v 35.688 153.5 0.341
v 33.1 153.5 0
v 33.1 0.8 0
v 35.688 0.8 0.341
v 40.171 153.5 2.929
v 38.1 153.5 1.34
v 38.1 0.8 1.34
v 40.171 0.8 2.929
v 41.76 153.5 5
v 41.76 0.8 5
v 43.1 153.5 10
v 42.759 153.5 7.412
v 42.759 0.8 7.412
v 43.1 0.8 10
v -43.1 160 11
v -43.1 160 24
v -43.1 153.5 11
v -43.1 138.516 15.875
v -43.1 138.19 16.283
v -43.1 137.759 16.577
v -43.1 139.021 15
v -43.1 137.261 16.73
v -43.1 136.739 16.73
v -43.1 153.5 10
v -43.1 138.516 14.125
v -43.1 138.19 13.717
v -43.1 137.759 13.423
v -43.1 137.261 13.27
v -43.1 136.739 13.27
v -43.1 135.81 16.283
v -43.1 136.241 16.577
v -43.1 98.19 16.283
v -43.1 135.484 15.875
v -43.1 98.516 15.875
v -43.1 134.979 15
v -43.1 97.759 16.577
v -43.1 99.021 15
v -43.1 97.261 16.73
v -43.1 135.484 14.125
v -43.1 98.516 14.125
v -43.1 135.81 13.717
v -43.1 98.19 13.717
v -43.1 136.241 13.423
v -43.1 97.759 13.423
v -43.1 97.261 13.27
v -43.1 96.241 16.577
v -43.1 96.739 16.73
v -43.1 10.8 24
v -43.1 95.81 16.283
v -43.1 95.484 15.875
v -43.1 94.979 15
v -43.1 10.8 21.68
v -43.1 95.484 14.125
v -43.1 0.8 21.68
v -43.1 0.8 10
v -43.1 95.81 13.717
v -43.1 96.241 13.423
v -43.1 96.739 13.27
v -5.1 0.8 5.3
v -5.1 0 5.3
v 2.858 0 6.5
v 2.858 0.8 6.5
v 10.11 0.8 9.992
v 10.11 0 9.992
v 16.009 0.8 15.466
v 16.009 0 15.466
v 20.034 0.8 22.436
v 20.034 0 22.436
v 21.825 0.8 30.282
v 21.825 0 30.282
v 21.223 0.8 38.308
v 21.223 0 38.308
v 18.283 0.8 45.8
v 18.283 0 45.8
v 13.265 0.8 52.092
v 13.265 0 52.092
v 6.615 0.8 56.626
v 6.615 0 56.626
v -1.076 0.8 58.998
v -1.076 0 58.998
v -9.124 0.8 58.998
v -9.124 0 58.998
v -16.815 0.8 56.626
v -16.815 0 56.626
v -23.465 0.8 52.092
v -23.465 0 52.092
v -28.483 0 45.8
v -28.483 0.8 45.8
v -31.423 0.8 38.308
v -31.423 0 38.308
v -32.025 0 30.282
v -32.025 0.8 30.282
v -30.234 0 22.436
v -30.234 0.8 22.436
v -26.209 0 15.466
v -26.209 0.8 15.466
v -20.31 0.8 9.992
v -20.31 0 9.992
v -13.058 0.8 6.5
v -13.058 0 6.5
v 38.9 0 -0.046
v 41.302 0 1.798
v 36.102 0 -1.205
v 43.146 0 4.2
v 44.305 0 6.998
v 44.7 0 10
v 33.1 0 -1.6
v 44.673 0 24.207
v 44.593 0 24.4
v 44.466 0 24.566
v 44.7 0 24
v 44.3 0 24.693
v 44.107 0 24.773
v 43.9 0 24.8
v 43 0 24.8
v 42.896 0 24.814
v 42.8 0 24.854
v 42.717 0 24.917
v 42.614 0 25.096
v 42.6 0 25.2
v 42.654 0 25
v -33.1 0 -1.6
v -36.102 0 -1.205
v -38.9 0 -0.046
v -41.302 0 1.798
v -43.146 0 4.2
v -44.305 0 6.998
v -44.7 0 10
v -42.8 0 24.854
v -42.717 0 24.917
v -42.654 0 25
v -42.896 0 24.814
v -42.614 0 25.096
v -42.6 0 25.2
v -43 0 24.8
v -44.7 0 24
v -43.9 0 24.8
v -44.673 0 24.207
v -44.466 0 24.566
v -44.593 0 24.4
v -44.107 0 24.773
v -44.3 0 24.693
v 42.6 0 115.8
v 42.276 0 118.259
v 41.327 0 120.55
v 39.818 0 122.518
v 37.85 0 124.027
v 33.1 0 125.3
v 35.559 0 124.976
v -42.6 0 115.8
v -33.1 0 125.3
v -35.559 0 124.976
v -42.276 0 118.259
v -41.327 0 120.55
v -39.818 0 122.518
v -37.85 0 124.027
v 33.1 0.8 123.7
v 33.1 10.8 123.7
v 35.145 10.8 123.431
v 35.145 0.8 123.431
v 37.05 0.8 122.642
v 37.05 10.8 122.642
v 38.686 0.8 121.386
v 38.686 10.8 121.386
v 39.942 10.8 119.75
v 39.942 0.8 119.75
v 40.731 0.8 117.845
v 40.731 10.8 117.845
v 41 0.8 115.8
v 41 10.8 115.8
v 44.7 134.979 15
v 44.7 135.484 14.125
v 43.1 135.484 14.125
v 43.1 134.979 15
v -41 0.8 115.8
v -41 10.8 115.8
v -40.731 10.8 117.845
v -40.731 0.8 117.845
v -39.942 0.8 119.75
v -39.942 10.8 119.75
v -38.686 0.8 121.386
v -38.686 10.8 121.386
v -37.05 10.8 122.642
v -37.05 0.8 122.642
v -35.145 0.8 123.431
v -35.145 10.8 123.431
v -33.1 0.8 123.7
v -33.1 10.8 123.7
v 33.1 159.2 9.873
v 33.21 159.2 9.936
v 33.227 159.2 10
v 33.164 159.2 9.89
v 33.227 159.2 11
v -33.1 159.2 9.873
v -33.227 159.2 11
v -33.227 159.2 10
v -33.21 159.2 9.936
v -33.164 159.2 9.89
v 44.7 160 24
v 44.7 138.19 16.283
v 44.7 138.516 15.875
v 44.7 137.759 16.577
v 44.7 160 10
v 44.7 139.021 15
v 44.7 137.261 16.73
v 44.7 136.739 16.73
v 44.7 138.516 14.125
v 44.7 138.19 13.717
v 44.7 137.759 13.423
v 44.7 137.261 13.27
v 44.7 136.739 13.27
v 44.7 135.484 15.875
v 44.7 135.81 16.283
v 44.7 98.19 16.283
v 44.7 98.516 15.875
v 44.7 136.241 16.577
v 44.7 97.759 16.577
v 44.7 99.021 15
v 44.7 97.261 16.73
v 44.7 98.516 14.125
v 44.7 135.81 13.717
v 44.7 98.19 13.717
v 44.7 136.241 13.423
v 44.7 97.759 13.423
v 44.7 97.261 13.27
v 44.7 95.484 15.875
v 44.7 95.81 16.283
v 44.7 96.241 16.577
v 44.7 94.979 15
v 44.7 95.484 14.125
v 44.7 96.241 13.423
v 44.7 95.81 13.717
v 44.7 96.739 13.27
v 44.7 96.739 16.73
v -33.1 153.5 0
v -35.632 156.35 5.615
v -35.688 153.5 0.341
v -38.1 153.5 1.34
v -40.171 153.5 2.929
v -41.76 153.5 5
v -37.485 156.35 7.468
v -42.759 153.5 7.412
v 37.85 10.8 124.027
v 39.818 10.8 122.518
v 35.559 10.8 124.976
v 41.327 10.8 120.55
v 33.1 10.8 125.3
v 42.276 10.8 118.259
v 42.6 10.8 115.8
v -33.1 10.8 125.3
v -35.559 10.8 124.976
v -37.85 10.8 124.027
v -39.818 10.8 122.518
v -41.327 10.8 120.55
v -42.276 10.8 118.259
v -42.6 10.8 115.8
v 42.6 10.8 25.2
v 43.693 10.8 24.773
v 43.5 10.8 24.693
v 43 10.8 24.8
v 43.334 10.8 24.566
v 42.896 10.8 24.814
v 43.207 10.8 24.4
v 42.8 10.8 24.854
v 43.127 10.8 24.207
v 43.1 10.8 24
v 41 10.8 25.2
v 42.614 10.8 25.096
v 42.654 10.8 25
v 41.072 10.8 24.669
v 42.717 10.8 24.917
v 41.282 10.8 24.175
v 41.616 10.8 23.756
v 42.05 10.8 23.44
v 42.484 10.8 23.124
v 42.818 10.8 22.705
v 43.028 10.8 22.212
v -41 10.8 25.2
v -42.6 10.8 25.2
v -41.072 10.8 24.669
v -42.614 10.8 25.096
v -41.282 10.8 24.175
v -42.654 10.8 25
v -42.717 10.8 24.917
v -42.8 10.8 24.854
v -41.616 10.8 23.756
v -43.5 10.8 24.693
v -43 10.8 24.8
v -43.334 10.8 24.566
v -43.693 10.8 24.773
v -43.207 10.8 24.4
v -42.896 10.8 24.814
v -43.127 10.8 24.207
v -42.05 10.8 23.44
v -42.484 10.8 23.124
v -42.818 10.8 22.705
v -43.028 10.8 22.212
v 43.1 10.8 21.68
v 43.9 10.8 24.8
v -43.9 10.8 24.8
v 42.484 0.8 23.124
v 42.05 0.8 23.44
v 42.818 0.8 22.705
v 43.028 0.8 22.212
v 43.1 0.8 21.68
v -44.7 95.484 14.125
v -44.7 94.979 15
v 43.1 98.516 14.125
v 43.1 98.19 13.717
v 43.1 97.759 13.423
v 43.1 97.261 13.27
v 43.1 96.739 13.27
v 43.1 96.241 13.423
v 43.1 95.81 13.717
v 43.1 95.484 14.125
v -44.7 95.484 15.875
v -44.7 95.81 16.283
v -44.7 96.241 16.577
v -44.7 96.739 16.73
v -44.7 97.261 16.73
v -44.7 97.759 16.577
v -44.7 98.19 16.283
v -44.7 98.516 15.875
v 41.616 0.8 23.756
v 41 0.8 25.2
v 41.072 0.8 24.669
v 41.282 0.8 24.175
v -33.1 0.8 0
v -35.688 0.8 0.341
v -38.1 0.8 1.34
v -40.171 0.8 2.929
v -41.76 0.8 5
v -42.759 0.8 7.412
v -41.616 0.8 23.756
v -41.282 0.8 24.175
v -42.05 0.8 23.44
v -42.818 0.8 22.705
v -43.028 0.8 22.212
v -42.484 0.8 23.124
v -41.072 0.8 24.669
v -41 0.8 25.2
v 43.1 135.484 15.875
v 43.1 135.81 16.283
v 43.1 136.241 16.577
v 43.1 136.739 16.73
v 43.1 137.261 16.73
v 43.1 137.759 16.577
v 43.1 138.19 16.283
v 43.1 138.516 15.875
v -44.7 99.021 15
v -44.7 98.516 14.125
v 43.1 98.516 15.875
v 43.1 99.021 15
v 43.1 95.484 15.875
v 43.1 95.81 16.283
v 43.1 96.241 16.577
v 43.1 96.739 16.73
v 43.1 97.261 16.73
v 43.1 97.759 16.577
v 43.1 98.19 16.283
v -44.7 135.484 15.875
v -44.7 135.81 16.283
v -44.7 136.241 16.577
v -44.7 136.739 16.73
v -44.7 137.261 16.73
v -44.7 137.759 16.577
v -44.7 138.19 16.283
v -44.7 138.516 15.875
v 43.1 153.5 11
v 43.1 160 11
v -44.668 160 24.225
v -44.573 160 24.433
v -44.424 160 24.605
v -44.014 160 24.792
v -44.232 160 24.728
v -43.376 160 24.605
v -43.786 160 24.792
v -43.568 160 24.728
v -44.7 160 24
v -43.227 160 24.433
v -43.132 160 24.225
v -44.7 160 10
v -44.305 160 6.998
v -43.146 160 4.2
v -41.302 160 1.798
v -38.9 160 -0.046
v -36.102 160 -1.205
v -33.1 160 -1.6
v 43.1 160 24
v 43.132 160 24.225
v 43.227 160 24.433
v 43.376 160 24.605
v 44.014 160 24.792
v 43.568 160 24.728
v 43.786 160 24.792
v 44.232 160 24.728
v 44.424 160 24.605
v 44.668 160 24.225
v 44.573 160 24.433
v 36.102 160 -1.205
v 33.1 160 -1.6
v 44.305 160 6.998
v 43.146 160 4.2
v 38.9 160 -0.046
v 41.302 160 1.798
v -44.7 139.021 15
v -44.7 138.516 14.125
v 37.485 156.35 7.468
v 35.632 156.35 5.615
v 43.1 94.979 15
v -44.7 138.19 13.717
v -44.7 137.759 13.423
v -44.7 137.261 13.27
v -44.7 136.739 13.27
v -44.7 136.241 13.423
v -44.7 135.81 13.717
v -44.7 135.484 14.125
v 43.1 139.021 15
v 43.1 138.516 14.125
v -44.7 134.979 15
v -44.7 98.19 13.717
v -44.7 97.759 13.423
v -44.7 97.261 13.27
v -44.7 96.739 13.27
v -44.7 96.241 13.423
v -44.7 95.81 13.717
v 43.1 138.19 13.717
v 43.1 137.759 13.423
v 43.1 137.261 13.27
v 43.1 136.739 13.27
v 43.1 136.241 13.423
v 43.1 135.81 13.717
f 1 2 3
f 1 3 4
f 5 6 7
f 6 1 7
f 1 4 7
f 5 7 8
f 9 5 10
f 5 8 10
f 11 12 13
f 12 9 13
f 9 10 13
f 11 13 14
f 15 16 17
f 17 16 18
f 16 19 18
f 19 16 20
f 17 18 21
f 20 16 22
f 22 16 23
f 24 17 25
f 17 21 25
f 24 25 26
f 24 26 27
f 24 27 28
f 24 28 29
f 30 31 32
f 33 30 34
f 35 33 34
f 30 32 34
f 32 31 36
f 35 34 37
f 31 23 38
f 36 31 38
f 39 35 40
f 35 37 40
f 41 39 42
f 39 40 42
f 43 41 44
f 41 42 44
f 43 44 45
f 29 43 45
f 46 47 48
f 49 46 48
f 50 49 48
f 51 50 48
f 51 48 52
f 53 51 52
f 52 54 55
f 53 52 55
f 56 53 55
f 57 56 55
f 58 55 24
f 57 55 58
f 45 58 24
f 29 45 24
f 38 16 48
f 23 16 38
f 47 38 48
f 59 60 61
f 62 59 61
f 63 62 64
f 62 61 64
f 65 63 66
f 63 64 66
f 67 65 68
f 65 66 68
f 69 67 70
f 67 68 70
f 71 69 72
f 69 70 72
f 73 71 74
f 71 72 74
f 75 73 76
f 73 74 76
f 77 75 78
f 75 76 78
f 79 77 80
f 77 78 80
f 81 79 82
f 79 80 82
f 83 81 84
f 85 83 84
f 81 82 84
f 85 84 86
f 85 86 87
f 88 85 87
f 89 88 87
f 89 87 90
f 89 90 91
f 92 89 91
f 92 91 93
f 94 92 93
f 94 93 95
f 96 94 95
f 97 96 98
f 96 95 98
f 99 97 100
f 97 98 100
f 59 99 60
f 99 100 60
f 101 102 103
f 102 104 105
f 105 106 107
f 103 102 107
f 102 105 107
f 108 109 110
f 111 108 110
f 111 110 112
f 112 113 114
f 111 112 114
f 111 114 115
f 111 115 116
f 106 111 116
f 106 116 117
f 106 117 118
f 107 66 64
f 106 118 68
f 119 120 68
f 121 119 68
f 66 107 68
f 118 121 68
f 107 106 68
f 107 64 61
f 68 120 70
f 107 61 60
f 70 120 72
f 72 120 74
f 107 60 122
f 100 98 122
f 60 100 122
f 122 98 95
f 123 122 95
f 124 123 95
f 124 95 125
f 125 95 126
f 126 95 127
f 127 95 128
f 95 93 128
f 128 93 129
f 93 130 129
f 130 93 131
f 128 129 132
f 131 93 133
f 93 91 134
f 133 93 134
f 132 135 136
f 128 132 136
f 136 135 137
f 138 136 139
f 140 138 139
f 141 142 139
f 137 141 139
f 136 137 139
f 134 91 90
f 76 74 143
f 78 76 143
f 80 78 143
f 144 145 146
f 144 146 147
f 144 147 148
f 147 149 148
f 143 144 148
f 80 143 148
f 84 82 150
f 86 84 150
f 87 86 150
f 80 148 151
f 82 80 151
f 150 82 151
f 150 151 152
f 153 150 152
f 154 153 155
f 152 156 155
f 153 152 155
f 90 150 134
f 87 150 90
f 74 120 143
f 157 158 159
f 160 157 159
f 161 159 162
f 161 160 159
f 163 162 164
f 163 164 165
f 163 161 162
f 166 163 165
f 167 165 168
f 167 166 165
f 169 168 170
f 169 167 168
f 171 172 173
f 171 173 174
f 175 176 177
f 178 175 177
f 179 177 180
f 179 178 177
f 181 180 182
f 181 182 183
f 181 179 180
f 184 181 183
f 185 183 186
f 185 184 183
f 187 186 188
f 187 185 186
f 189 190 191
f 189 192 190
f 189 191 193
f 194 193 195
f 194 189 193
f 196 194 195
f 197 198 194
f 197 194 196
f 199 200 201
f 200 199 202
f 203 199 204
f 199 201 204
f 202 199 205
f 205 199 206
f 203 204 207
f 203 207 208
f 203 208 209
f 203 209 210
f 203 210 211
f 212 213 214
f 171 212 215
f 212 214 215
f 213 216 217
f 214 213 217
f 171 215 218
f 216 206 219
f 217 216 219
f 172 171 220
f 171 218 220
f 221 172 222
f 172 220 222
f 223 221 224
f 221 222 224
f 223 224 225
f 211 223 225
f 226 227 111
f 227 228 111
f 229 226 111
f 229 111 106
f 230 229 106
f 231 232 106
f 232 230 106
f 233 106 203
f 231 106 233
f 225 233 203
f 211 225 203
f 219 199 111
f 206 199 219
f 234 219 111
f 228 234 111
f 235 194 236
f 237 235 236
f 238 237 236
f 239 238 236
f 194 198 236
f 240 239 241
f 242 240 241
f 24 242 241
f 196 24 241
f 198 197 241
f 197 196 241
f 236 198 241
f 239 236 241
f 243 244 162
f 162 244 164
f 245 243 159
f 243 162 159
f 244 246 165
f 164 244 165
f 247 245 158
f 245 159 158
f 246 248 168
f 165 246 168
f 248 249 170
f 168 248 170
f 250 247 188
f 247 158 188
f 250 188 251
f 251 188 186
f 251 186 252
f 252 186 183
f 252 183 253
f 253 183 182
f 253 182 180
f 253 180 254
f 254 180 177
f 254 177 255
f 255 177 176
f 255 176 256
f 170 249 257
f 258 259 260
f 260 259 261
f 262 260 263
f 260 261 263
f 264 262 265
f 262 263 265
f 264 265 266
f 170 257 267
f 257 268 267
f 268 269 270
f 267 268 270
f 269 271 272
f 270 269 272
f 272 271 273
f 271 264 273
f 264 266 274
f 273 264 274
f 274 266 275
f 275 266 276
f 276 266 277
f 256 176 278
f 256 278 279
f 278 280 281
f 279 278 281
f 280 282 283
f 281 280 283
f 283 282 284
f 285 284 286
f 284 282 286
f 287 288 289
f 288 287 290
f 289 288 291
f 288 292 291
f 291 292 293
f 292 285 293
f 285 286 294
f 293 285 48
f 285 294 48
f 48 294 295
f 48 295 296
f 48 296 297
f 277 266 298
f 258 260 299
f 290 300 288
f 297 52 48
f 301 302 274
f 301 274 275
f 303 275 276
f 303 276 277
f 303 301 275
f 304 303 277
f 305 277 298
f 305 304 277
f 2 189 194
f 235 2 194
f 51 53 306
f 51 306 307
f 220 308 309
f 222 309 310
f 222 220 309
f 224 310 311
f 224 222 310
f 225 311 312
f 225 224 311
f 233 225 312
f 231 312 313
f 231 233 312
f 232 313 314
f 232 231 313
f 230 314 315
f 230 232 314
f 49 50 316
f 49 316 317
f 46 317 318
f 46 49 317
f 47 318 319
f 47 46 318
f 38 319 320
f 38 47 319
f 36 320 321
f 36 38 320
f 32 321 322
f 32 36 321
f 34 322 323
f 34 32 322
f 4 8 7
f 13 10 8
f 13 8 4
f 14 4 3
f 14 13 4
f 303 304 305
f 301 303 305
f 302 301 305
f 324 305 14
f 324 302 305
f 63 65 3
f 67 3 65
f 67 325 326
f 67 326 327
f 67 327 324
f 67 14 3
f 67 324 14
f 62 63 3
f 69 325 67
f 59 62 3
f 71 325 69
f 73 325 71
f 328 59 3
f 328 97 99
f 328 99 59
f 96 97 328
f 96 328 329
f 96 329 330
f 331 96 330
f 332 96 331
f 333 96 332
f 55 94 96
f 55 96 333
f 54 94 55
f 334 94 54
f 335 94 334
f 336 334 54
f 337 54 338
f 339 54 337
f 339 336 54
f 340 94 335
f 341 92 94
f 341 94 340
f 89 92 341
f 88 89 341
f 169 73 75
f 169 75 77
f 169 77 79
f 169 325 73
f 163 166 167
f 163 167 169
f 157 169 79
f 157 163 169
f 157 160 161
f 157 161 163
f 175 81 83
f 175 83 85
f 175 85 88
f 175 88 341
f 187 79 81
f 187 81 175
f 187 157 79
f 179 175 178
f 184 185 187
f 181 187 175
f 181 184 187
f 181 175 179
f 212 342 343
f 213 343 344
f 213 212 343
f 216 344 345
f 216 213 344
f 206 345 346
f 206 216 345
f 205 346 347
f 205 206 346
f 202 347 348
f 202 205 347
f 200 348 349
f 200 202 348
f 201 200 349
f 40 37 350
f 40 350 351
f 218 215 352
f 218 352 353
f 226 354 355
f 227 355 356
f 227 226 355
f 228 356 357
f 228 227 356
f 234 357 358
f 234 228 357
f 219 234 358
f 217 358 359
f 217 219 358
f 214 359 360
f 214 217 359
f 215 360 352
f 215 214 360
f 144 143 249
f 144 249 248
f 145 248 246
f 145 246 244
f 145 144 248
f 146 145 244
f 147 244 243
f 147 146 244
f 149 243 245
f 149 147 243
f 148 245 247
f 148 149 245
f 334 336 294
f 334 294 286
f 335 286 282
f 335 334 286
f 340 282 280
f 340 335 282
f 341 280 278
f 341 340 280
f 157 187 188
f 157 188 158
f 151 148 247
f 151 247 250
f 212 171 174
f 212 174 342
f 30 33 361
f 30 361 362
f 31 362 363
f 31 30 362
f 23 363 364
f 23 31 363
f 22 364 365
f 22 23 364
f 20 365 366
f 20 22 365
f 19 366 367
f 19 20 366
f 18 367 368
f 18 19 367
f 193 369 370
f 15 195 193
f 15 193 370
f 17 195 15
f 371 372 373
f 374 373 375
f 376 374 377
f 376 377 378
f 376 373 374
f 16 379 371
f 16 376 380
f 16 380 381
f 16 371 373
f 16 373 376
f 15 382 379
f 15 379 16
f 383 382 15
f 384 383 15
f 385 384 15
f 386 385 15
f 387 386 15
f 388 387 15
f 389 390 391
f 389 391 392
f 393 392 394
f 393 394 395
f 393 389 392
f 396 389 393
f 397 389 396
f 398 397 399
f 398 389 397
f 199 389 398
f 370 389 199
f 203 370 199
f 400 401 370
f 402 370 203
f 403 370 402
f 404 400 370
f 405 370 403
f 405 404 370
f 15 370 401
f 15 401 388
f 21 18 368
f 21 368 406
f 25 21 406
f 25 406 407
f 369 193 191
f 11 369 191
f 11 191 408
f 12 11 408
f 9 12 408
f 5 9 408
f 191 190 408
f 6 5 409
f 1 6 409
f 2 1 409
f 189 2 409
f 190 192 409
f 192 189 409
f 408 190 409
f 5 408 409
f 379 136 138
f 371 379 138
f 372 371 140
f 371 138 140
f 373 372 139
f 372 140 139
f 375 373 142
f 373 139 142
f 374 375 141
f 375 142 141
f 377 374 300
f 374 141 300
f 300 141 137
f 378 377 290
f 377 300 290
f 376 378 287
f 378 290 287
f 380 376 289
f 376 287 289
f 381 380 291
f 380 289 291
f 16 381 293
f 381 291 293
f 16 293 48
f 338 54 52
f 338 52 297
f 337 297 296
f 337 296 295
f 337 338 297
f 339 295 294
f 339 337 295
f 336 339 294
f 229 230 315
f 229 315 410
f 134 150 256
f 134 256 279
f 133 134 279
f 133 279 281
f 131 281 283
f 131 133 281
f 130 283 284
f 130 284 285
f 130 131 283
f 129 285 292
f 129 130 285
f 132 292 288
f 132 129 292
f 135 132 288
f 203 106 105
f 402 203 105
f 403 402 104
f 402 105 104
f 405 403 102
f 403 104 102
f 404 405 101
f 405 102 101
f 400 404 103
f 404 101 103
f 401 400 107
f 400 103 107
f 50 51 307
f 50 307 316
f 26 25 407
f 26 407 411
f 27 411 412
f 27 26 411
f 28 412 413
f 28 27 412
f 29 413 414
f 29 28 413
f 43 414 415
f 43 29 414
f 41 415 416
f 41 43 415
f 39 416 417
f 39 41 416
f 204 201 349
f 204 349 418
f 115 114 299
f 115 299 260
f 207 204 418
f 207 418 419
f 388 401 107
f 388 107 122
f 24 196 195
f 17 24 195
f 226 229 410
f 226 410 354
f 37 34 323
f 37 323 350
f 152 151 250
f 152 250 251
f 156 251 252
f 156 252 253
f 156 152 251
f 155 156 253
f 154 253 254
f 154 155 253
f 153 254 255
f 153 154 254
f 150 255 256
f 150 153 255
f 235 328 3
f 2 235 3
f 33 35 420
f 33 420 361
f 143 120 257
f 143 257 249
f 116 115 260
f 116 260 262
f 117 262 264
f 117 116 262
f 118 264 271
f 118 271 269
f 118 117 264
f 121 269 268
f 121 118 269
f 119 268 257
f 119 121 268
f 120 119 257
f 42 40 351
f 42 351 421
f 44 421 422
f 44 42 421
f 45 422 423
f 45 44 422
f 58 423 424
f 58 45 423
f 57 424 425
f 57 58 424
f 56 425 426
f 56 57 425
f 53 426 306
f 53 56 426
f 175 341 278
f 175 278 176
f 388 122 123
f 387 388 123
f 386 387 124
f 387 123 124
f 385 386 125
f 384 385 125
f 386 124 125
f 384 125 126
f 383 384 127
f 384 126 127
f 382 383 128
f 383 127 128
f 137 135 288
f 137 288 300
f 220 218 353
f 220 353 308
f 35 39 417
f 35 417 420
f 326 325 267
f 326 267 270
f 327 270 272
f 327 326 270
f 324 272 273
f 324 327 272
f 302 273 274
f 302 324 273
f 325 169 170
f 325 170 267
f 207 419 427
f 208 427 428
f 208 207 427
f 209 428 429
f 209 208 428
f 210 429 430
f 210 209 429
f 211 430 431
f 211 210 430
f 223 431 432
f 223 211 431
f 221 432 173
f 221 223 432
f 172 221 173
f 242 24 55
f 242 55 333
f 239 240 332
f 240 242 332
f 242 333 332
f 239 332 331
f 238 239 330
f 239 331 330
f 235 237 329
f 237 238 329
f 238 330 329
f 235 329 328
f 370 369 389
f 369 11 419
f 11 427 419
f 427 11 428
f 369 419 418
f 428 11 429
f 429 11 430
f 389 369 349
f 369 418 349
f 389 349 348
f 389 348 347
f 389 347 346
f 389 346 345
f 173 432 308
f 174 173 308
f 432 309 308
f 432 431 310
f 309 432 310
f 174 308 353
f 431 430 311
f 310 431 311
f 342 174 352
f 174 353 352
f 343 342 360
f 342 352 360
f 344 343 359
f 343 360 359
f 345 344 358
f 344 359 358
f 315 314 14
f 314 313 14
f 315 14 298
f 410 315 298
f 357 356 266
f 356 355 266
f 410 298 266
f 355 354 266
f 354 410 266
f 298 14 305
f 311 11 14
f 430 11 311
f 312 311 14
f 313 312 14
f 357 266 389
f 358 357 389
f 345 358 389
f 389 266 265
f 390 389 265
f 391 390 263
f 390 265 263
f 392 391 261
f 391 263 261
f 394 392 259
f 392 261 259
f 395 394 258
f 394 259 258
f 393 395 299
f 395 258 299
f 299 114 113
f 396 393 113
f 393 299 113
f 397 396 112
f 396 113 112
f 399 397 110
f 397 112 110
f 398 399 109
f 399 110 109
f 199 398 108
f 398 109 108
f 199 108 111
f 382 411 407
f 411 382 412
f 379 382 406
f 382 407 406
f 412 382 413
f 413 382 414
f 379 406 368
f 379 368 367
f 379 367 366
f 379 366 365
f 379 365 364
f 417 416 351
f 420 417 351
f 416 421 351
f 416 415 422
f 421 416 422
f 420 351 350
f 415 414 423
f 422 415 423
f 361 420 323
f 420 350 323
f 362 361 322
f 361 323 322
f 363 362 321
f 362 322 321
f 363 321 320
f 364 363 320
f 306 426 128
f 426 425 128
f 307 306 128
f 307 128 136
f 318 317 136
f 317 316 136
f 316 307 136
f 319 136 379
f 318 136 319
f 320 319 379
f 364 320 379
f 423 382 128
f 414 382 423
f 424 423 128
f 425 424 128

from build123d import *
from OCP.BRepFilletAPI import BRepFilletAPI_MakeChamfer

# Parameters (mm, degrees)
BOSS_EXTRUDE1_DEPTH = 160
BOSS_EXTRUDE2_START = -0.8
BOSS_EXTRUDE2_DEPTH = 0.8
CUT_EXTRUDE1_DEPTH  = 185.952426316
SKETCH4_R           = 27
BOSS_EXTRUDE3_DEPTH = 0.8
FILLET1_R           = 0.4
BOSS_EXTRUDE4_DEPTH = 10
FILLET2_R           = 2
CHAMFER1_SIZE       = 5.7
CHAMFER1_SIZE2      = 9.872689603


with BuildPart() as part:
    # Sketch1 → Boss-Extrude1 (new body)
    with BuildSketch(Plane(origin=(0, 0, 0), x_dir=(1, 0, 0), z_dir=(0, 1, 0))):
        with BuildLine():
            Line((-33.1, 0), (33.1, 0))
            ThreePointArc((33.1, 0), (40.171067812, -2.928932188), (43.1, -10))
            Line((43.1, -10), (43.1, -24))
            ThreePointArc((43.1, -24), (43.9, -24.8), (44.7, -24))
            Line((44.7, -24), (44.7, -10))
            ThreePointArc((44.7, -10), (41.302438662, -1.797561338), (33.1, 1.6))
            Line((33.1, 1.6), (-33.1, 1.6))
            ThreePointArc((-33.1, 1.6), (-41.302438662, -1.797561338), (-44.7, -10))
            Line((-44.7, -10), (-44.7, -24))
            ThreePointArc((-44.7, -24), (-43.9, -24.8), (-43.1, -24))
            Line((-43.1, -24), (-43.1, -10))
            ThreePointArc((-43.1, -10), (-40.171067812, -2.928932188), (-33.1, 0))
        make_face()
    extrude(amount=BOSS_EXTRUDE1_DEPTH)

    # Sketch2 → Boss-Extrude2 (add)
    with BuildSketch(Plane(origin=(0, 160, 0), x_dir=(1, 0, 0), z_dir=(0, 1, 0)).offset(BOSS_EXTRUDE2_START)):
        with BuildLine():
            Line((44.7, -10), (44.7, -11))
            Line((44.7, -11), (-44.7, -11))
            Line((-44.7, -11), (-44.7, -10))
            ThreePointArc((-44.7, -10), (-41.302438662, -1.797561338), (-33.1, 1.6))
            Line((-33.1, 1.6), (33.1, 1.6))
            ThreePointArc((33.1, 1.6), (41.302438662, -1.797561338), (44.7, -10))
        make_face()
    extrude(amount=BOSS_EXTRUDE2_DEPTH)

    # Sketch3 → Cut-Extrude1 (cut, through all)
    with BuildSketch(Plane(origin=(44.7, 0, 0), x_dir=(0, 0, -1), z_dir=(1, 0, 0))):
        with BuildLine():
            Line((-15.875, 138.515544457), (-15, 139.020725942))
            Line((-15, 139.020725942), (-14.125, 138.515544457))
            ThreePointArc((-14.125, 138.515544457), (-13.25, 137), (-14.125, 135.484455543))
            Line((-14.125, 135.484455543), (-15, 134.979274058))
            Line((-15, 134.979274058), (-15.875, 135.484455543))
            ThreePointArc((-15.875, 135.484455543), (-16.75, 137), (-15.875, 138.515544457))
        make_face()
        with BuildLine():
            Line((-15.875, 98.515544457), (-15, 99.020725942))
            Line((-15, 99.020725942), (-14.125, 98.515544457))
            ThreePointArc((-14.125, 98.515544457), (-13.25, 97), (-14.125, 95.484455543))
            Line((-14.125, 95.484455543), (-15, 94.979274058))
            Line((-15, 94.979274058), (-15.875, 95.484455543))
            ThreePointArc((-15.875, 95.484455543), (-16.75, 97), (-15.875, 98.515544457))
        make_face()
    extrude(amount=-CUT_EXTRUDE1_DEPTH, mode=Mode.SUBTRACT)

    # Sketch4 → Boss-Extrude3 (add)
    with BuildSketch(Plane.XZ):
        with BuildLine():
            Line((-43.9, 24.8), (-42.6, 24.8))
            Line((-42.6, 24.8), (-42.6, 115.8))
            ThreePointArc((-42.6, 115.8), (-39.817514421, 122.517514421), (-33.1, 125.3))
            Line((-33.1, 125.3), (33.1, 125.3))
            ThreePointArc((33.1, 125.3), (39.817514421, 122.517514421), (42.6, 115.8))
            Line((42.6, 115.8), (42.6, 24.8))
            Line((42.6, 24.8), (43.9, 24.8))
            ThreePointArc((43.9, 24.8), (43.334314575, 24.565685425), (43.1, 24))
            Line((43.1, 24), (43.1, 10))
            ThreePointArc((43.1, 10), (40.171067812, 2.928932188), (33.1, 0))
            Line((33.1, 0), (-33.1, 0))
            ThreePointArc((-33.1, 0), (-40.171067812, 2.928932188), (-43.1, 10))
            Line((-43.1, 10), (-43.1, 24))
            ThreePointArc((-43.1, 24), (-43.334314575, 24.565685425), (-43.9, 24.8))
        make_face()
        with Locations(Location((-5.1, 32.3, 0), (0, 0, 270))):
            Circle(SKETCH4_R, mode=Mode.SUBTRACT)
    extrude(amount=-BOSS_EXTRUDE3_DEPTH)

    # Fillet1
    fillet1_edges = [part.edges().sort_by_distance(p)[0] for p in [
        (-42.6, 0.4, 24.8),
        (42.6, 0.4, 24.8),
    ]]
    fillet(fillet1_edges, radius=FILLET1_R)

    # Sketch6 → Boss-Extrude4 (add)
    with BuildSketch(Plane(origin=(0, 0.8, 0), x_dir=(1, 0, 0), z_dir=(0, 1, 0))):
        with BuildLine():
            Line((-43.1, -23.2), (-43, -23.2))
            ThreePointArc((-43, -23.2), (-41.585786438, -23.785786438), (-41, -25.2))
            Line((-41, -25.2), (-41, -115.8))
            ThreePointArc((-41, -115.8), (-38.686143571, -121.386143571), (-33.1, -123.7))
            Line((-33.1, -123.7), (33.1, -123.7))
            ThreePointArc((33.1, -123.7), (38.686143571, -121.386143571), (41, -115.8))
            Line((41, -115.8), (41, -25.2))
            ThreePointArc((41, -25.2), (41.585786438, -23.785786438), (43, -23.2))
            Line((43, -23.2), (43.1, -23.2))
            Line((43.1, -23.2), (43.1, -24))
            ThreePointArc((43.1, -24), (43.334314575, -24.565685425), (43.9, -24.8))
            Line((43.9, -24.8), (43, -24.8))
            ThreePointArc((43, -24.8), (42.717157288, -24.917157288), (42.6, -25.2))
            Line((42.6, -25.2), (42.6, -115.8))
            ThreePointArc((42.6, -115.8), (39.817514421, -122.517514421), (33.1, -125.3))
            Line((33.1, -125.3), (-33.1, -125.3))
            ThreePointArc((-33.1, -125.3), (-39.817514421, -122.517514421), (-42.6, -115.8))
            Line((-42.6, -115.8), (-42.6, -25.2))
            ThreePointArc((-42.6, -25.2), (-42.717157288, -24.917157288), (-43, -24.8))
            Line((-43, -24.8), (-43.9, -24.8))
            ThreePointArc((-43.9, -24.8), (-43.334314575, -24.565685425), (-43.1, -24))
            Line((-43.1, -24), (-43.1, -23.2))
        make_face()
    extrude(amount=BOSS_EXTRUDE4_DEPTH)

    # Fillet2
    # the kernel refuses this fillet: 2 mm, written as the material it adds along each edge
    with BuildSketch(Plane(origin=(43.1, 0.8, 23.2), x_dir=(-0.9748527767632401, 0, 0.22284986793130537), z_dir=(0, 1, 0))) as fillet2_piece_1:
        with BuildLine():
            CenterArc((1.610986416, -1.927420567), FILLET2_R, 105.482875224, 61.640649972)
            Line((-0.338719137, -1.481720831), (-0.533689693, -1.437150857))
            Line((-0.533689693, -1.437150857), (-0.194970555, 0.044569974))
            Line((-0.194970555, 0.044569974), (0.044569974, 0.194970555))
            ThreePointArc((0.044569974, 0.194970555), (0.142055251, 0.172685569), (1.023695645, 0.192742057))
            Line((1.023695645, 0.192742057), (1.077085715, 0))
        make_face()
    extrude(amount=10)
    with BuildSketch(Plane(origin=(-43.1, 0.8, 23.2), x_dir=(0.9748527767632457, 0, 0.2228498679312814), z_dir=(0, 1, 0))) as fillet2_piece_2:
        with BuildLine():
            CenterArc((1.610986416, 1.927420567), FILLET2_R, 192.876474804, 61.640649972)
            Line((-0.338719137, 1.481720831), (-0.533689693, 1.437150857))
            Line((-0.533689693, 1.437150857), (-0.194970555, -0.044569974))
            Line((-0.194970555, -0.044569974), (0.044569974, -0.194970555))
            ThreePointArc((0.044569974, -0.194970555), (0.142055251, -0.172685569), (1.023695645, -0.192742057))
            Line((1.023695645, -0.192742057), (1.077085715, 0))
        make_face()
    extrude(amount=10)

    # Chamfer1: one chamfer whose edges measure the first distance from different faces: ONE call of the kernel's chamfer builder (chamfer() names one face for all edges)
    chamfer1_edges_1 = [part.edges().sort_by_distance(p)[0] for p in [
        (0, 159.2, 0),
    ]]
    chamfer1_side_1 = [part.faces().sort_by_distance(p)[0] for p in [
        (0, 80, 0),
    ]]
    chamfer1_edges_2 = [part.edges().sort_by_distance(p)[0] for p in [
        (40.171067812, 159.2, 2.928932188),
    ]]
    chamfer1_side_2 = [part.faces().sort_by_distance(p)[0] for p in [
        (40.171067812, 80, 2.928932188),
    ]]
    chamfer1_edges_3 = [part.edges().sort_by_distance(p)[0] for p in [
        (43.1, 159.2, 10.5),
    ]]
    chamfer1_side_3 = [part.faces().sort_by_distance(p)[0] for p in [
        (43.1, 80.829745828, 16.958586697),
    ]]
    chamfer1_edges_4 = [part.edges().sort_by_distance(p)[0] for p in [
        (-43.1, 159.2, 10.5),
    ]]
    chamfer1_side_4 = [part.faces().sort_by_distance(p)[0] for p in [
        (-43.1, 80.829745828, 16.958586697),
    ]]
    chamfer1_edges_5 = [part.edges().sort_by_distance(p)[0] for p in [
        (-40.171067812, 159.2, 2.928932188),
    ]]
    chamfer1_side_5 = [part.faces().sort_by_distance(p)[0] for p in [
        (-40.171067812, 80, 2.928932188),
    ]]
    chamfer1 = BRepFilletAPI_MakeChamfer(part.part.solid().wrapped)
    for e in chamfer1_edges_1:
        chamfer1.Add(CHAMFER1_SIZE, CHAMFER1_SIZE2, e.wrapped, chamfer1_side_1[0].wrapped)  # the first distance lies on this face
    for e in chamfer1_edges_2:
        chamfer1.Add(CHAMFER1_SIZE, CHAMFER1_SIZE2, e.wrapped, chamfer1_side_2[0].wrapped)  # the first distance lies on this face
    for e in chamfer1_edges_3:
        chamfer1.Add(CHAMFER1_SIZE, CHAMFER1_SIZE2, e.wrapped, chamfer1_side_3[0].wrapped)  # the first distance lies on this face
    for e in chamfer1_edges_4:
        chamfer1.Add(CHAMFER1_SIZE, CHAMFER1_SIZE2, e.wrapped, chamfer1_side_4[0].wrapped)  # the first distance lies on this face
    for e in chamfer1_edges_5:
        chamfer1.Add(CHAMFER1_SIZE, CHAMFER1_SIZE2, e.wrapped, chamfer1_side_5[0].wrapped)  # the first distance lies on this face
    add(Compound.cast(chamfer1.Shape()), mode=Mode.REPLACE)


solid = part.part
